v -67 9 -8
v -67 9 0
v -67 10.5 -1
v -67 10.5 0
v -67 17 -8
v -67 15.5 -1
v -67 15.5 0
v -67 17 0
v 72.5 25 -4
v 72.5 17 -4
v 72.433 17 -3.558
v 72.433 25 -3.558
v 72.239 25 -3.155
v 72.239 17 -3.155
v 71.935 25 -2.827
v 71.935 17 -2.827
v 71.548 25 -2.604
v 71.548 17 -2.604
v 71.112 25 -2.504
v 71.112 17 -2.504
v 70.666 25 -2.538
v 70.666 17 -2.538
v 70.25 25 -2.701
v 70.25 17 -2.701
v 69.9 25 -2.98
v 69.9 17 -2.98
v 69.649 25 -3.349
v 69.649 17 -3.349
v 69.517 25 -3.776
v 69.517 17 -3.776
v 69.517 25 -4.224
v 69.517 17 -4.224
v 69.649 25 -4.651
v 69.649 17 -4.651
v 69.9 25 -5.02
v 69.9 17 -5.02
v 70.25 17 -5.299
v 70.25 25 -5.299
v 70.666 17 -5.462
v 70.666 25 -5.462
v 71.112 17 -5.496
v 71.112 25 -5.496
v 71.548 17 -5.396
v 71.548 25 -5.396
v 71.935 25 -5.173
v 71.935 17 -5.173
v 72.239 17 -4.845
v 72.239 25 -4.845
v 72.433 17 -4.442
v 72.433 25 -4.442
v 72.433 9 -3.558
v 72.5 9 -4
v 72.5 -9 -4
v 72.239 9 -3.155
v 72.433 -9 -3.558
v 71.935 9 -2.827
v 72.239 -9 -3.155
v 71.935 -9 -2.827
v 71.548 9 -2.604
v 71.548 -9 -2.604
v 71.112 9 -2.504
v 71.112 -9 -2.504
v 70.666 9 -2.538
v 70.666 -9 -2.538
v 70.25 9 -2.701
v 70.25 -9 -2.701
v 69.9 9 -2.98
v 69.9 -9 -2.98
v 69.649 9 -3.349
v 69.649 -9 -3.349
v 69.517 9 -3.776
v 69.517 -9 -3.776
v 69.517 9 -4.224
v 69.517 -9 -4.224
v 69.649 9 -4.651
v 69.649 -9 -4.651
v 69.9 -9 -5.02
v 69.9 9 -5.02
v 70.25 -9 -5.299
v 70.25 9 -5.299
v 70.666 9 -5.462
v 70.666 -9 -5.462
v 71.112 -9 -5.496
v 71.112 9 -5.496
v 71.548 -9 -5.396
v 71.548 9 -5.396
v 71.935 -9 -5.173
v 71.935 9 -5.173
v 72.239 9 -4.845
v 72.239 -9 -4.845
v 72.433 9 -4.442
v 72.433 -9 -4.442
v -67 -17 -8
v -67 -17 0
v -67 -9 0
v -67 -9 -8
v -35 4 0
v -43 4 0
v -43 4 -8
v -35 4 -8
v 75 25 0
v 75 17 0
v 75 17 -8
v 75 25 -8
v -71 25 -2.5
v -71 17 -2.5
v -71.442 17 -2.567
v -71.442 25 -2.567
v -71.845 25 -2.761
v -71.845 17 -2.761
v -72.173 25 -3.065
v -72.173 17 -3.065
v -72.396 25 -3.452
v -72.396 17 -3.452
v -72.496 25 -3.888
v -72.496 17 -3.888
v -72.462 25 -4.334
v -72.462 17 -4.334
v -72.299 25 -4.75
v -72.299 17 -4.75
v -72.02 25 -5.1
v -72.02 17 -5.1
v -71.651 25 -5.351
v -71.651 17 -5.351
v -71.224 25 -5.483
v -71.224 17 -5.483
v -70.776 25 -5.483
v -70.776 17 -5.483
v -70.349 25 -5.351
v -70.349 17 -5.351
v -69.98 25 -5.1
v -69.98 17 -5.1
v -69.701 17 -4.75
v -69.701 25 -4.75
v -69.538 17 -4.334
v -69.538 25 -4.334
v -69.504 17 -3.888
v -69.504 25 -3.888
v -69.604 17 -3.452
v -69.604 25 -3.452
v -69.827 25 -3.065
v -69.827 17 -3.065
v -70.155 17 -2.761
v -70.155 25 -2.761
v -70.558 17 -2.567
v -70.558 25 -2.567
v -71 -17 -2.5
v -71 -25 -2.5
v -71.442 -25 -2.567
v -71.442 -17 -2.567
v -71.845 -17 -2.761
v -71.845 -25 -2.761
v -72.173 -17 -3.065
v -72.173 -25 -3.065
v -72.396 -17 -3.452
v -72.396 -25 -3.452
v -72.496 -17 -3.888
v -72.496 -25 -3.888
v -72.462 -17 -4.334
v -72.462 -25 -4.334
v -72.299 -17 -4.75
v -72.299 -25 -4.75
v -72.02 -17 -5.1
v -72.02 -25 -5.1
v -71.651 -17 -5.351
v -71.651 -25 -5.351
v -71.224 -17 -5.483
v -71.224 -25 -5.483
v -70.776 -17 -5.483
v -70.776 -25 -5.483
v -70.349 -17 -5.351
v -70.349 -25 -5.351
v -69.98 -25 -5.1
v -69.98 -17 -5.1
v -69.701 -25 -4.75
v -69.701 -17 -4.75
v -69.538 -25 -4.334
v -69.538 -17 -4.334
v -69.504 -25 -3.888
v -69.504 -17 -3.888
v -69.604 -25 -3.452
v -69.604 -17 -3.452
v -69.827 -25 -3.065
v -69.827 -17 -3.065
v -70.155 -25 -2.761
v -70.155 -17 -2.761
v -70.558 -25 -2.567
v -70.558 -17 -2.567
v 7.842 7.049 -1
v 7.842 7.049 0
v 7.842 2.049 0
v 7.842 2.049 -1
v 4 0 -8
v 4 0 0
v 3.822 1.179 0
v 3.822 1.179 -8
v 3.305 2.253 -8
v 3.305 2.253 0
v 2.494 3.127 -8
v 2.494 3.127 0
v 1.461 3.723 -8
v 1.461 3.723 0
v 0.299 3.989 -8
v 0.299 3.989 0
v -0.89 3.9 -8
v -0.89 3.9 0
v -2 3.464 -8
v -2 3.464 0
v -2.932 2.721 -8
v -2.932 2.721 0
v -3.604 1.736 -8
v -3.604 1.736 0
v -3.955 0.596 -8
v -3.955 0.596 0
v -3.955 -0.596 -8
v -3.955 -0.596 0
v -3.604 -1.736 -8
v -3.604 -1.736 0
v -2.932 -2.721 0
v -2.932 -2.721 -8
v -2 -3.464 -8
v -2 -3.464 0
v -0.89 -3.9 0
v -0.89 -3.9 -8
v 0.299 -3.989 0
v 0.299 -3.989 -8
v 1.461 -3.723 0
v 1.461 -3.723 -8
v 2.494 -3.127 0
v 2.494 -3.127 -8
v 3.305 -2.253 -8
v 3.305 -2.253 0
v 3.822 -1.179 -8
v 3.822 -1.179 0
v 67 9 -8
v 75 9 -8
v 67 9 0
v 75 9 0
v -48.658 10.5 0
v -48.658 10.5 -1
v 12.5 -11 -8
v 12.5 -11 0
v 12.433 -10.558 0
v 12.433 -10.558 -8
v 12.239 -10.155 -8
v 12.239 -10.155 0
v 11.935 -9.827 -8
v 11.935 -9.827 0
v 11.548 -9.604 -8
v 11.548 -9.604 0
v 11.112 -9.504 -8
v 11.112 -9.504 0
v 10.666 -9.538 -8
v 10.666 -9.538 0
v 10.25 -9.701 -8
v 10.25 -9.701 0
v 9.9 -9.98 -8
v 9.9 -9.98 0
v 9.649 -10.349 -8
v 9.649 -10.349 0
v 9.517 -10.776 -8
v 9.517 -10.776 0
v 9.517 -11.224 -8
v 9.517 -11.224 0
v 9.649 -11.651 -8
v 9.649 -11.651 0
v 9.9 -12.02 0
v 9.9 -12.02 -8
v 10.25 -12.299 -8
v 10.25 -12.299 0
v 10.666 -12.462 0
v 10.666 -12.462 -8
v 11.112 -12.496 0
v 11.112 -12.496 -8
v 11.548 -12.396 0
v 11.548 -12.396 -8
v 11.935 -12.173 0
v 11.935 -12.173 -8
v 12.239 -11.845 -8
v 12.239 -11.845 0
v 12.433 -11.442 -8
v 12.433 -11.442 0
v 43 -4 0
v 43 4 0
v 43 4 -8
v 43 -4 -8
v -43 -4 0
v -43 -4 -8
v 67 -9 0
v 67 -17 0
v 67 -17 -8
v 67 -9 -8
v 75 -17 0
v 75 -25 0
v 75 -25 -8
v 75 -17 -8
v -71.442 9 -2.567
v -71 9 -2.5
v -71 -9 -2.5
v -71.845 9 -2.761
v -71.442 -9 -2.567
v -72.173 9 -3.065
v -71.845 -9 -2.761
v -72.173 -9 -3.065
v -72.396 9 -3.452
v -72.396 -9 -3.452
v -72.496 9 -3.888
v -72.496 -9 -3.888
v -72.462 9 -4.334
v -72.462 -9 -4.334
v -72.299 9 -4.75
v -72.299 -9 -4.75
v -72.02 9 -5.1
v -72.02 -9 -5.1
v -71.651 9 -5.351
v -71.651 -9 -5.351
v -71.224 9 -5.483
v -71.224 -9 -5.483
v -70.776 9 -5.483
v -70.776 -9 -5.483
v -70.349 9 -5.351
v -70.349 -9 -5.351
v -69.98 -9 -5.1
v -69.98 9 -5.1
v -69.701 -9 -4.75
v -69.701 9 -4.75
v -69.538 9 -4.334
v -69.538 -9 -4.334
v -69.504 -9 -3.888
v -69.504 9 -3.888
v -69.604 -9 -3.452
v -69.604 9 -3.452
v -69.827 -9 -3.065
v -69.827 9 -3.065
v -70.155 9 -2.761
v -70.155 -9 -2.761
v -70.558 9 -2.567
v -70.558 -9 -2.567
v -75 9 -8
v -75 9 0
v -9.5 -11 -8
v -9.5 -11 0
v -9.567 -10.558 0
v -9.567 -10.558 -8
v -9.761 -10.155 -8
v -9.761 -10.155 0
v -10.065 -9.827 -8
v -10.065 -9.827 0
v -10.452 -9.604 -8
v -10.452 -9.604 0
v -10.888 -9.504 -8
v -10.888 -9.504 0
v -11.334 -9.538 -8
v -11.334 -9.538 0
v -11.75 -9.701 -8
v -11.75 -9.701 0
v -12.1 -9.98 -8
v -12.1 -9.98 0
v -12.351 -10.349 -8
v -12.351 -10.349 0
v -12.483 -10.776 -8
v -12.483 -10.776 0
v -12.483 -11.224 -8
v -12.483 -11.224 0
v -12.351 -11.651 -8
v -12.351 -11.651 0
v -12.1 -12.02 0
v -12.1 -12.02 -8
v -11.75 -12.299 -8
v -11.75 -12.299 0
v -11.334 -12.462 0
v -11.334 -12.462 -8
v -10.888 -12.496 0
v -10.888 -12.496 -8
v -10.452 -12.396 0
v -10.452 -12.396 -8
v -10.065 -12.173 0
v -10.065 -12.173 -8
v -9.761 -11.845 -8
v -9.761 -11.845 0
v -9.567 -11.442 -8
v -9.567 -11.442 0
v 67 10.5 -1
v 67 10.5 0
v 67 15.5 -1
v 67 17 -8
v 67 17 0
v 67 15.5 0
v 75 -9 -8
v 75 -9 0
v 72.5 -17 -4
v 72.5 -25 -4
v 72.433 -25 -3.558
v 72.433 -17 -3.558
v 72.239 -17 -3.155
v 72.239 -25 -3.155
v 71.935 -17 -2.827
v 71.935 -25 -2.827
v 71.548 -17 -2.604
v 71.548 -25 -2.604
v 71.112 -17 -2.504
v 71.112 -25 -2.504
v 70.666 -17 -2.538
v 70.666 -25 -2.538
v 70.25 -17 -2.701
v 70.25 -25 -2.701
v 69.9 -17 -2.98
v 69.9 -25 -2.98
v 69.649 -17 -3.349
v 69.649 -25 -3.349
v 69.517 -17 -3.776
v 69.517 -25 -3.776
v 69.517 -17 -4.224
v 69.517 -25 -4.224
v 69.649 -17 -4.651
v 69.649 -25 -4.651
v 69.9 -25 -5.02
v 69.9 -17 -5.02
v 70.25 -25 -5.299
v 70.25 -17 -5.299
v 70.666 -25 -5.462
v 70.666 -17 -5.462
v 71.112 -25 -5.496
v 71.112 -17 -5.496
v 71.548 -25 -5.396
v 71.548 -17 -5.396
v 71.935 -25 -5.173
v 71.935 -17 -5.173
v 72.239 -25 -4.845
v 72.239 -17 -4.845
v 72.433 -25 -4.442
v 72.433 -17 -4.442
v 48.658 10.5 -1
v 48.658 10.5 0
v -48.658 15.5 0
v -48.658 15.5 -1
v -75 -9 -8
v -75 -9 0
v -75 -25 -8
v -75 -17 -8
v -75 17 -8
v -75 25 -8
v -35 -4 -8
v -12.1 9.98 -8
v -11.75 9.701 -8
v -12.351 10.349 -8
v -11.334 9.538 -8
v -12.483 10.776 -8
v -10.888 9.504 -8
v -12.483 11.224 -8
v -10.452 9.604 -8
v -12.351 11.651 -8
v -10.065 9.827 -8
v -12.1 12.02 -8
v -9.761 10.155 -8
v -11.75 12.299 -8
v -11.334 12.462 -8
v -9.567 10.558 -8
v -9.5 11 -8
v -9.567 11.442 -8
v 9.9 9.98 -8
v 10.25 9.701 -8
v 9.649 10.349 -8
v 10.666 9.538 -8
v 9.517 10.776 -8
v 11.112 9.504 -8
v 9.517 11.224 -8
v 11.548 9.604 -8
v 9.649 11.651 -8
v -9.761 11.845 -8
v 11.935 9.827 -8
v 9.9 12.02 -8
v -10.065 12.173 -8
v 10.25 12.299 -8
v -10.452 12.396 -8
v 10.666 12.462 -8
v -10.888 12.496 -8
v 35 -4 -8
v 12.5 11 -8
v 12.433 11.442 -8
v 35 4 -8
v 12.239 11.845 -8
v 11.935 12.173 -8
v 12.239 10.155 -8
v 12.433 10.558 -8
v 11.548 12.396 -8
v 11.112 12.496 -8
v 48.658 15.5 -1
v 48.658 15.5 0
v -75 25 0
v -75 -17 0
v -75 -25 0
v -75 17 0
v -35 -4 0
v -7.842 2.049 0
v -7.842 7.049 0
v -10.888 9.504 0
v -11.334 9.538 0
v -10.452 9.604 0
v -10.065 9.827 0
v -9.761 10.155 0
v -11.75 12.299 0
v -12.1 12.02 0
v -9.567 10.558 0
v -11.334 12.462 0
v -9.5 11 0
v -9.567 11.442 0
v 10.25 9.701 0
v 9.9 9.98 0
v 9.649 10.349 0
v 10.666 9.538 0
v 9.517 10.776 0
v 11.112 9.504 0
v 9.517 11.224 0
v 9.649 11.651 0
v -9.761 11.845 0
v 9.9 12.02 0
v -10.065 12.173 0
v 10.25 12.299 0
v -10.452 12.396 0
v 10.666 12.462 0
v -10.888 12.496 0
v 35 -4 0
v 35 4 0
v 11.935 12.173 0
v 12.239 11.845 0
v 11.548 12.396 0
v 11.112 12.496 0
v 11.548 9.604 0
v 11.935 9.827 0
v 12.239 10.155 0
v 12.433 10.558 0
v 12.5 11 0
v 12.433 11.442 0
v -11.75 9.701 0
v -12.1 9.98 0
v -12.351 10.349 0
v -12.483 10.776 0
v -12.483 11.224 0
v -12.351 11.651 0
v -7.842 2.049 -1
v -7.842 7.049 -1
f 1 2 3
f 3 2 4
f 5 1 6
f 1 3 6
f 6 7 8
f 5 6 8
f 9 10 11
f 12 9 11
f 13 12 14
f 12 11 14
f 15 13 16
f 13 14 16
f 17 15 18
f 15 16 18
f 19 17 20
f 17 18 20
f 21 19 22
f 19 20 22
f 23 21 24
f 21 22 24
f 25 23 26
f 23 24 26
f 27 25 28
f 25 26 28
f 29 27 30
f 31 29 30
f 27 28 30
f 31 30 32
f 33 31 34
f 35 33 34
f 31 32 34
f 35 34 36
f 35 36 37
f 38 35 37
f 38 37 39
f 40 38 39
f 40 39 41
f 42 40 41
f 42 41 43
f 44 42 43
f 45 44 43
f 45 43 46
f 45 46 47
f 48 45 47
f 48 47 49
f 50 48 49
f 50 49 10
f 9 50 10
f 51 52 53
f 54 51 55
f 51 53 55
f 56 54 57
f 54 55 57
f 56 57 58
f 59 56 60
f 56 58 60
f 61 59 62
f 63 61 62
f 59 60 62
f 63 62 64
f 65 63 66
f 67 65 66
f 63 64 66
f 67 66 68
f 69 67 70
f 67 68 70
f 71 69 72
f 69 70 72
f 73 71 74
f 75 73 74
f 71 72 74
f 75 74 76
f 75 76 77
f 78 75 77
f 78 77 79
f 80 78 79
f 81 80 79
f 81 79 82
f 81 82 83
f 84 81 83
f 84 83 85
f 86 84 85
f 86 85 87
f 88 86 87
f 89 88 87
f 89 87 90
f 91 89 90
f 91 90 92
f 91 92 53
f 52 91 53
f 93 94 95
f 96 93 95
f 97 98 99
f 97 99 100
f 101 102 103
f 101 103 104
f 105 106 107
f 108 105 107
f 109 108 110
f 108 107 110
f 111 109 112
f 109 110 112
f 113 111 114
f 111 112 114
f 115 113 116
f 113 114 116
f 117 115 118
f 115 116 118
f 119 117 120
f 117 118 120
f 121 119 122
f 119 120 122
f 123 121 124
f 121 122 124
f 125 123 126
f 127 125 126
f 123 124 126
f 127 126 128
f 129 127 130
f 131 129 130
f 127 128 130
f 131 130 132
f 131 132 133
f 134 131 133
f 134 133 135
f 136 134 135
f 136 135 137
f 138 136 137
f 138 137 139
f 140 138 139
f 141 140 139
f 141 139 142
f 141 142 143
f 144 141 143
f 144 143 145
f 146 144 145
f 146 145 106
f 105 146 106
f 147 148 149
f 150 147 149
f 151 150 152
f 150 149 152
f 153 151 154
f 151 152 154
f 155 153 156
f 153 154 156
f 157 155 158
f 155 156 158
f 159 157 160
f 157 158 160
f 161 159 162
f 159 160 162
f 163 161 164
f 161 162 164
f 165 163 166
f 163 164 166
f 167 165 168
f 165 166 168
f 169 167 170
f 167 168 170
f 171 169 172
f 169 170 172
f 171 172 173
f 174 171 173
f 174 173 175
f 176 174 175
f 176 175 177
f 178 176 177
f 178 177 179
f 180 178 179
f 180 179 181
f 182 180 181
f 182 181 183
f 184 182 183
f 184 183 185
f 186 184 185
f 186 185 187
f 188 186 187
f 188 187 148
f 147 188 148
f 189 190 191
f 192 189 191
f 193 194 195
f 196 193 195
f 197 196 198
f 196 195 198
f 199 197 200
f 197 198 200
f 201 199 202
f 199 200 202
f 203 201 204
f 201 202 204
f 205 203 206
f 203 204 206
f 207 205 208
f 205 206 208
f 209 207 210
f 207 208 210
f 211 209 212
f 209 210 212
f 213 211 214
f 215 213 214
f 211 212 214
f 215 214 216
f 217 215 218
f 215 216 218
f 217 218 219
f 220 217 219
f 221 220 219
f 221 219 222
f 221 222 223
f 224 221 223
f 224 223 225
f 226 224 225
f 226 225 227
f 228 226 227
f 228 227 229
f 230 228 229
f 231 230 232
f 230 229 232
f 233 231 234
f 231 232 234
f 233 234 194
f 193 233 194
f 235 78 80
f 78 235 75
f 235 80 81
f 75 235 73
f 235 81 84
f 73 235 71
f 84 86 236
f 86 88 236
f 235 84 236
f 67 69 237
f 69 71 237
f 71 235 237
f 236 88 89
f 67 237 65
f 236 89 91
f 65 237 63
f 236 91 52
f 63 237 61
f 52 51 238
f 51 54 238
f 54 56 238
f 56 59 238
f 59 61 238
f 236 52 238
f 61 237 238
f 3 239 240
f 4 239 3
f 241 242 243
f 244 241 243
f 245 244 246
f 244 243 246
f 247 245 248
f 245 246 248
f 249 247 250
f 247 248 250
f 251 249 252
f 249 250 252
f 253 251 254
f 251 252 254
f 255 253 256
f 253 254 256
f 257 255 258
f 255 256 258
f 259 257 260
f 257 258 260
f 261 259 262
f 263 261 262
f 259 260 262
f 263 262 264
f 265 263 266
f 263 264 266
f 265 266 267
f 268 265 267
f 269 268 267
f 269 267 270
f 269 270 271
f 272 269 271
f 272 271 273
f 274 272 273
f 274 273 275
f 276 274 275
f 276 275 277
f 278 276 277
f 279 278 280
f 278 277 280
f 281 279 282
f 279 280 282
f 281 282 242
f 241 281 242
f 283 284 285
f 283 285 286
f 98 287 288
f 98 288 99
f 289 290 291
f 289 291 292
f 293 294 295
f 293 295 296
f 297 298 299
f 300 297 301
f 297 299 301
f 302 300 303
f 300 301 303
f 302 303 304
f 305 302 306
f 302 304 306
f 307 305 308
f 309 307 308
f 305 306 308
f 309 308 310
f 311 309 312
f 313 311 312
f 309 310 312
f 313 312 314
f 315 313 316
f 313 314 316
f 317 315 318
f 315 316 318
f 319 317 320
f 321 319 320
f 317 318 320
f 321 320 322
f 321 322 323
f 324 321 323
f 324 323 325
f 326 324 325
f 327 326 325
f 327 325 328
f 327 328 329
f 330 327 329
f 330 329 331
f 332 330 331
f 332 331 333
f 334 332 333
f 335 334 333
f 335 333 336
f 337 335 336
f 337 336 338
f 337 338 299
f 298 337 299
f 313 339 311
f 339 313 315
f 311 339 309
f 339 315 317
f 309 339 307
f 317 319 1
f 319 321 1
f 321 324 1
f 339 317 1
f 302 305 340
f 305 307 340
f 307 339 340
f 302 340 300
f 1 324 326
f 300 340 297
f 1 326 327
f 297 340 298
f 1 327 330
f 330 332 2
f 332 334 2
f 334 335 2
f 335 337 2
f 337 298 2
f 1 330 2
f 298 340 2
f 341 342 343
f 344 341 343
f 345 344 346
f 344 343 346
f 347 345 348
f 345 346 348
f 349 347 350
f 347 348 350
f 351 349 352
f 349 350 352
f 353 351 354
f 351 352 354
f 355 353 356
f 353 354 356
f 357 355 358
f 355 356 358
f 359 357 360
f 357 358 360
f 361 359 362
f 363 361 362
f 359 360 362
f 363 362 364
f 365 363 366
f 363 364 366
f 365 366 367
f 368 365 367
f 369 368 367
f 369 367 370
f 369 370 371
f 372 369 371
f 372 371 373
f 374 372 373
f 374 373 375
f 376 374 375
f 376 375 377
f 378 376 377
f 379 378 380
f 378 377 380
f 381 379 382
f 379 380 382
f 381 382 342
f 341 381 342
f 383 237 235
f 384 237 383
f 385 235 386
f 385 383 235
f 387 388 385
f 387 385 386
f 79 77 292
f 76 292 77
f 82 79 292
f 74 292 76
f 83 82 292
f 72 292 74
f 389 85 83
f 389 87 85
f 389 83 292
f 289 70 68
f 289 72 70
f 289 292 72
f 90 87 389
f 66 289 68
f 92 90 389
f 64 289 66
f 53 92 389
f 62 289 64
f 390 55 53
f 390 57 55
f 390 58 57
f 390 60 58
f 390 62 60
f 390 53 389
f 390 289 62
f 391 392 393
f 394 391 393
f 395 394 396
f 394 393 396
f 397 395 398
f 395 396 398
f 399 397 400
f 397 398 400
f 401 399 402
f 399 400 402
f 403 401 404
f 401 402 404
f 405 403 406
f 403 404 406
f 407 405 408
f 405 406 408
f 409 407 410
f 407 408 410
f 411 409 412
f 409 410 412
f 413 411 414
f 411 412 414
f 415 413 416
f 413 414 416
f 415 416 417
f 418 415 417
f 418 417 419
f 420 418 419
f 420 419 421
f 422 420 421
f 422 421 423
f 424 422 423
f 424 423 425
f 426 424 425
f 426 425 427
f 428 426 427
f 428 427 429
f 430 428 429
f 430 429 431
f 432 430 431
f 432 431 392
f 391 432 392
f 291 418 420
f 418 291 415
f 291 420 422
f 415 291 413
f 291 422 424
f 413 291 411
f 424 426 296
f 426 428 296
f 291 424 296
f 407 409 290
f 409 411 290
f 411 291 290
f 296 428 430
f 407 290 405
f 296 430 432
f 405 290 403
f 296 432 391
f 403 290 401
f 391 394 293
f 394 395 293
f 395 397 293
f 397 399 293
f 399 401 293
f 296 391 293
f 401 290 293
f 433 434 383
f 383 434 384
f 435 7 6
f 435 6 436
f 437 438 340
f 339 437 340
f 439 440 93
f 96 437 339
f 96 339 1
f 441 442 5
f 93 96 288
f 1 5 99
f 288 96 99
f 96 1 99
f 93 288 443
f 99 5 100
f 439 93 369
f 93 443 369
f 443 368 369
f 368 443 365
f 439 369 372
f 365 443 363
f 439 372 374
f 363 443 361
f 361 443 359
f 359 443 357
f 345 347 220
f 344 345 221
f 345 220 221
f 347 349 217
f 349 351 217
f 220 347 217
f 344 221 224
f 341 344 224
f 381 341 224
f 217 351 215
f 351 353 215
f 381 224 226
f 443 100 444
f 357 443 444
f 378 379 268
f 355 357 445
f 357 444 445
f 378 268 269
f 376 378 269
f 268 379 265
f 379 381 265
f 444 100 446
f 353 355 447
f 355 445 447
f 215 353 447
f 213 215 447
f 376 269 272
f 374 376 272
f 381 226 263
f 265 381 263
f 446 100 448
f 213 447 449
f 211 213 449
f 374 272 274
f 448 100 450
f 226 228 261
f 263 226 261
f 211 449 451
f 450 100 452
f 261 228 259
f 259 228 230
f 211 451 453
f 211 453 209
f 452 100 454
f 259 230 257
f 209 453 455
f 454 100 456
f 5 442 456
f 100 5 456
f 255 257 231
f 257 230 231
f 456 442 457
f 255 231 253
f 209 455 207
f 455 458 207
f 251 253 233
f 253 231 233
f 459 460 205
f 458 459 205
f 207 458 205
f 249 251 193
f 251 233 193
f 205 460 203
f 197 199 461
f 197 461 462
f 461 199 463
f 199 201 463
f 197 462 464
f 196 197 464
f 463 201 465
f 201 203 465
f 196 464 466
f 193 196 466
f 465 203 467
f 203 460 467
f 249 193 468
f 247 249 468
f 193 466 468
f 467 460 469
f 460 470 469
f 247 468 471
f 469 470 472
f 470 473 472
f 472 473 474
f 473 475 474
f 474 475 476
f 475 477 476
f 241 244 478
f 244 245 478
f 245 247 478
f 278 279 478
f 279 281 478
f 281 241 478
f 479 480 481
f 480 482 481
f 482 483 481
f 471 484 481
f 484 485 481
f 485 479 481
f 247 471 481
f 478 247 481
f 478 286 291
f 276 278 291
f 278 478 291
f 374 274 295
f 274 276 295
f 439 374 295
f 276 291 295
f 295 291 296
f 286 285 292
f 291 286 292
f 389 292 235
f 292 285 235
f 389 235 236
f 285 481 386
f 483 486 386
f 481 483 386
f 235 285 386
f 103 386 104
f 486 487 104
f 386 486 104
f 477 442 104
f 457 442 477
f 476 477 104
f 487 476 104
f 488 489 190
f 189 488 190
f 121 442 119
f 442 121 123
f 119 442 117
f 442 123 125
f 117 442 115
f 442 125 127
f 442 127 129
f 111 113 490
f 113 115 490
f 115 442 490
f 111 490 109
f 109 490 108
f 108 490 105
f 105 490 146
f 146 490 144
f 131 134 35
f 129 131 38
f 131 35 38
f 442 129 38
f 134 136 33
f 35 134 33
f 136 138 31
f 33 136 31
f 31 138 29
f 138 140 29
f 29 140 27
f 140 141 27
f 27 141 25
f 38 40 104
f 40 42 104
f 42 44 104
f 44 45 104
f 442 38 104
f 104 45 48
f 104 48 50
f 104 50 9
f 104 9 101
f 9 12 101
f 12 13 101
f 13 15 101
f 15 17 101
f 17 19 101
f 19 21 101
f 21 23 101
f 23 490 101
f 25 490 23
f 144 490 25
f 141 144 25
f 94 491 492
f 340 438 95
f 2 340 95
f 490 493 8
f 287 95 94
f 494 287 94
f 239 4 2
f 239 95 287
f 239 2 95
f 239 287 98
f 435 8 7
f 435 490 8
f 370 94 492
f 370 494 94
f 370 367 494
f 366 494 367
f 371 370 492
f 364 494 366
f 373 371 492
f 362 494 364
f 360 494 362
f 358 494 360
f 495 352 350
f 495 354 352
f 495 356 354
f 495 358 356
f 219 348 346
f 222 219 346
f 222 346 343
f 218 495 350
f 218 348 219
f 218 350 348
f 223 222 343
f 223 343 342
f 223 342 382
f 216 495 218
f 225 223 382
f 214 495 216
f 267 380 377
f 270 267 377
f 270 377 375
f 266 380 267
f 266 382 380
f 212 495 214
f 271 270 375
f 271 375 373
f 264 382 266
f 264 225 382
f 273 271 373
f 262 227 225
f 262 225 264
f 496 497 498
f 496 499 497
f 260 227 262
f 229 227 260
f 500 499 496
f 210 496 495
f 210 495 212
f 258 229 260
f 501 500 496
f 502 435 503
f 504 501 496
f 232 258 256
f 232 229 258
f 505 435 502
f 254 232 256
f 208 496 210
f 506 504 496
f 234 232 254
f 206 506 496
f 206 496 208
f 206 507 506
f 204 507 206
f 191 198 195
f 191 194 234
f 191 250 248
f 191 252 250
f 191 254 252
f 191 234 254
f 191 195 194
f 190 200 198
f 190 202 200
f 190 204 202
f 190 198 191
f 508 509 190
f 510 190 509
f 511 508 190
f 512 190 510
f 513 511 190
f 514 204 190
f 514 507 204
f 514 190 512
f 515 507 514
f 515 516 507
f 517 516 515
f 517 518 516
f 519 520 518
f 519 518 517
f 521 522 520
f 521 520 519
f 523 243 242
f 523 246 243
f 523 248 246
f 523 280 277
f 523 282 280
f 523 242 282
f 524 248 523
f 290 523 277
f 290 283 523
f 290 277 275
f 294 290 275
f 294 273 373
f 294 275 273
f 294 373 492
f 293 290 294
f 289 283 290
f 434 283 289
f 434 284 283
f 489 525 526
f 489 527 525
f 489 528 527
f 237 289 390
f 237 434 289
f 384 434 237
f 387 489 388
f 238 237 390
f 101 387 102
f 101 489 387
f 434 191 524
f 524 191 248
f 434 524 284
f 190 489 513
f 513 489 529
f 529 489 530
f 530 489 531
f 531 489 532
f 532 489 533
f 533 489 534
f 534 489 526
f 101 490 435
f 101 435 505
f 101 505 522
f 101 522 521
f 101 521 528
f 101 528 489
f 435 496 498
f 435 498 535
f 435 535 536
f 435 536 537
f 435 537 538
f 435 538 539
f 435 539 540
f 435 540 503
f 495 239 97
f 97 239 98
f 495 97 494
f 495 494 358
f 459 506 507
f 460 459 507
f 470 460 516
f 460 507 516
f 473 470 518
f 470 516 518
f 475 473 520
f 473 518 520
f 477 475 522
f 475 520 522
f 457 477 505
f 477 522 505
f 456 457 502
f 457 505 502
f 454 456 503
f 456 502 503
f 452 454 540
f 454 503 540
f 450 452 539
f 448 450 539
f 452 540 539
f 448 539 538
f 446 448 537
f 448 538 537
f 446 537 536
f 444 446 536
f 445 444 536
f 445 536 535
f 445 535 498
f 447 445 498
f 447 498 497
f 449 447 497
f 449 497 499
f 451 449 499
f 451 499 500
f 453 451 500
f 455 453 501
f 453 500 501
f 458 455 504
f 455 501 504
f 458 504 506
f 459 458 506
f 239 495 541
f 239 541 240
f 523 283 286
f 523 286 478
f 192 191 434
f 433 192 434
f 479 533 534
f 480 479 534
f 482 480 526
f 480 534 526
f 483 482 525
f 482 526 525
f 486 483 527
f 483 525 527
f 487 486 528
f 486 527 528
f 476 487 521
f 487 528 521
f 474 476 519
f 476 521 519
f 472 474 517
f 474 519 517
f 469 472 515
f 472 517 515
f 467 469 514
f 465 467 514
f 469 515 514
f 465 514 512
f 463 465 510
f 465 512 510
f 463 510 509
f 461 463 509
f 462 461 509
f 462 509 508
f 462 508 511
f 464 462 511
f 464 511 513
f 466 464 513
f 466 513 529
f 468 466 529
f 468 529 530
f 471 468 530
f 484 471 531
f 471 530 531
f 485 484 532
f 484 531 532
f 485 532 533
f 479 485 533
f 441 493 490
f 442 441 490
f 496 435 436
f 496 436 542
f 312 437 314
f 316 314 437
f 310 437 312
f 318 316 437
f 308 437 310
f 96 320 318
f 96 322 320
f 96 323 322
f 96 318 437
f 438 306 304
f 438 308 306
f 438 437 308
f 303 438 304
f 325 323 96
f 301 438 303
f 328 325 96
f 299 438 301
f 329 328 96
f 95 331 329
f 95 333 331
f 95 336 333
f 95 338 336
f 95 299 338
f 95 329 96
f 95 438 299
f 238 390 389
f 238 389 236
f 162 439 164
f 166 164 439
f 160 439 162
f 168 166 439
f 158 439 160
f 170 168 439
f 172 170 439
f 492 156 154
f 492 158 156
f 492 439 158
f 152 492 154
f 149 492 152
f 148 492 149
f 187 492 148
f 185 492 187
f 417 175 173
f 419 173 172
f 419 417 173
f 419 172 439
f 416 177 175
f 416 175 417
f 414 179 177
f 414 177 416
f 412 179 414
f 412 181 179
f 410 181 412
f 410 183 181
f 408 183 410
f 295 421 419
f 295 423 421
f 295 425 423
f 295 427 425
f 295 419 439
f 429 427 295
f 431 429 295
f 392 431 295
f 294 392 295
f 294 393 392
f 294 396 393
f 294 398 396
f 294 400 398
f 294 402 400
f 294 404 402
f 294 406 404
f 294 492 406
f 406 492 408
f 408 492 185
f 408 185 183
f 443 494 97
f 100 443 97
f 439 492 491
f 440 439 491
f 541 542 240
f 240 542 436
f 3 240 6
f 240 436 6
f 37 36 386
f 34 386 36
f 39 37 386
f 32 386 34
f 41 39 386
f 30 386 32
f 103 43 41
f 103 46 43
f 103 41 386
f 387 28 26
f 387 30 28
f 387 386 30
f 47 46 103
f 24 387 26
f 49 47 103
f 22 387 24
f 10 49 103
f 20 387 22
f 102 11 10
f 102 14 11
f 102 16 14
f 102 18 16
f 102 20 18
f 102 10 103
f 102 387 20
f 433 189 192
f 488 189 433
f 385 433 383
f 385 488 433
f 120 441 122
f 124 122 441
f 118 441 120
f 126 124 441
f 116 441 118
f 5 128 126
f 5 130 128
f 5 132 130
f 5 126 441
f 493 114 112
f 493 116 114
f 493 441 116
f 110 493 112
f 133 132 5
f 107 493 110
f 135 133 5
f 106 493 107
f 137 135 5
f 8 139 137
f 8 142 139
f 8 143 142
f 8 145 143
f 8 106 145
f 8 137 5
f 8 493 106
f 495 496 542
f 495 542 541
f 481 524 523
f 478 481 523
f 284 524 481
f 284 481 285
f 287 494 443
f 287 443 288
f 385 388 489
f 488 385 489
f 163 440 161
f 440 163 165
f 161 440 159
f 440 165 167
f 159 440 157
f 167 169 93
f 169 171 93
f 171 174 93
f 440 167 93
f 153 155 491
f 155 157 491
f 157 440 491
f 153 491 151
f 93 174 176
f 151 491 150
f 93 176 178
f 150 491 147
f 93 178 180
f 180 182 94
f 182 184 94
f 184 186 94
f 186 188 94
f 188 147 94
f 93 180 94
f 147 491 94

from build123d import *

# Parameters (mm, degrees)
SKETCH1_W                                  = 150
SKETCH1_H                                  = 50
U_ARM_BOTTOM_BOSS_EXTRUDE1_DEPTH           = 8
SKETCH2_W                                  = 8
SKETCH2_H                                  = 8
PUZZLE_SLOT_CUT_EXTRUDE1_DEPTH             = 8
SKETCH3_R                                  = 4
CENTER_SHAFT_HOLE_CUT_EXTRUDE2_DEPTH       = 8
PUZZLE_SLOT_SCREW_HOLES_CUT_EXTRUDE3_REACH = 92.493
SKETCH4_R                                  = 1.5
SIDE_PUZZLE_SLOTS_CUT_EXTRUDE4_DEPTH       = 8
CABLE_CUT_EXTRUDE13_DEPTH                  = 1
SKETCH7_R                                  = 1.5
DISTANS_MOUNTING_HOLES_CUT_EXTRUDE1_DEPTH  = 8


with BuildPart() as part:
    # Sketch1 → U-Arm Bottom Boss-Extrude1 (new body)
    with BuildSketch(Plane.XY):
        Rectangle(SKETCH1_W, SKETCH1_H)
    extrude(amount=-U_ARM_BOTTOM_BOSS_EXTRUDE1_DEPTH)

    # Sketch2 → Puzzle Slot Cut-Extrude1 (cut)
    with BuildSketch(Plane.XY):
        with Locations((71, 13)):
            Rectangle(SKETCH2_W, SKETCH2_H)
        with Locations((71, -13)):
            Rectangle(SKETCH2_W, SKETCH2_H)
        with Locations((-71, -13)):
            Rectangle(SKETCH2_W, SKETCH2_H)
        with Locations((-71, 13)):
            Rectangle(SKETCH2_W, SKETCH2_H)
    extrude(amount=-PUZZLE_SLOT_CUT_EXTRUDE1_DEPTH, mode=Mode.SUBTRACT)

    # Sketch3 → Center Shaft Hole Cut-Extrude2 (cut)
    with BuildSketch(Plane.XY):
        Circle(SKETCH3_R)
    extrude(amount=-CENTER_SHAFT_HOLE_CUT_EXTRUDE2_DEPTH, mode=Mode.SUBTRACT)

    # Puzzle Slot Screw Holes Cut-Extrude3: up to this face of the body (flat: up to its plane)
    puzzle_slot_screw_holes_cut_extrude3_end = Plane(part.part.faces().sort_by_distance((0, 25, -4))[0])
    # Sketch4 → Puzzle Slot Screw Holes Cut-Extrude3 (cut, up to the picked face)
    with BuildSketch(Plane.XZ.offset(25), mode=Mode.PRIVATE) as puzzle_slot_screw_holes_cut_extrude3_sk1:
        with Locations(Location((-71, -4, 0), (0, 0, 90))):
            Circle(SKETCH4_R)
    puzzle_slot_screw_holes_cut_extrude3_tool1 = split(extrude(puzzle_slot_screw_holes_cut_extrude3_sk1.sketch, amount=-PUZZLE_SLOT_SCREW_HOLES_CUT_EXTRUDE3_REACH, mode=Mode.PRIVATE), bisect_by=puzzle_slot_screw_holes_cut_extrude3_end, keep=Keep.BOTH, mode=Mode.PRIVATE)
    # Sketch4 → Puzzle Slot Screw Holes Cut-Extrude3 (cut, up to the picked face)
    with BuildSketch(Plane.XZ.offset(25), mode=Mode.PRIVATE) as puzzle_slot_screw_holes_cut_extrude3_sk2:
        with Locations((71, -4)):
            Circle(SKETCH4_R)
    puzzle_slot_screw_holes_cut_extrude3_tool2 = split(extrude(puzzle_slot_screw_holes_cut_extrude3_sk2.sketch, amount=-PUZZLE_SLOT_SCREW_HOLES_CUT_EXTRUDE3_REACH, mode=Mode.PRIVATE), bisect_by=puzzle_slot_screw_holes_cut_extrude3_end, keep=Keep.BOTH, mode=Mode.PRIVATE)
    add(puzzle_slot_screw_holes_cut_extrude3_tool1.solids().sort_by(Axis((-71, -25, -4), (0, 1, 0)))[0], mode=Mode.SUBTRACT)
    add(puzzle_slot_screw_holes_cut_extrude3_tool2.solids().sort_by(Axis((71, -25, -4), (0, 1, 0)))[0], mode=Mode.SUBTRACT)

    # Sketch5 → Side Puzzle Slots Cut-Extrude4 (cut)
    with BuildSketch(Plane.XY):
        Polygon((-35, 4), (-35, 0), (-35, -4), (-43, -4), (-43, 4), align=None)
        Polygon((43, 4), (43, -4), (35, -4), (35, 0), (35, 4), align=None)
    extrude(amount=-SIDE_PUZZLE_SLOTS_CUT_EXTRUDE4_DEPTH, mode=Mode.SUBTRACT)

    # Sketch6 → Cable Cut-Extrude13 (cut)
    with BuildSketch(Plane.XY):
        Polygon((67, 15.5), (48.657587673, 15.5), (7.841649412, 7.048524191), (7.841649412, 2.048524191), (48.657587673, 10.5), (67, 10.5), align=None)
        Polygon((-7.841649412, 7.048524191), (-7.841649412, 2.048524191), (-48.657587673, 10.5), (-67, 10.5), (-67, 15.5), (-48.657587673, 15.5), align=None)
    extrude(amount=-CABLE_CUT_EXTRUDE13_DEPTH, mode=Mode.SUBTRACT)

    # Sketch7 → Distans Mounting Holes Cut-Extrude1 (cut)
    with BuildSketch(Plane.XY):
        with Locations((11, 11)):
            Circle(SKETCH7_R)
        with Locations((-11, 11)):
            Circle(SKETCH7_R)
        with Locations((-11, -11)):
            Circle(SKETCH7_R)
        with Locations((11, -11)):
            Circle(SKETCH7_R)
    extrude(amount=-DISTANS_MOUNTING_HOLES_CUT_EXTRUDE1_DEPTH, mode=Mode.SUBTRACT)


solid = part.part
